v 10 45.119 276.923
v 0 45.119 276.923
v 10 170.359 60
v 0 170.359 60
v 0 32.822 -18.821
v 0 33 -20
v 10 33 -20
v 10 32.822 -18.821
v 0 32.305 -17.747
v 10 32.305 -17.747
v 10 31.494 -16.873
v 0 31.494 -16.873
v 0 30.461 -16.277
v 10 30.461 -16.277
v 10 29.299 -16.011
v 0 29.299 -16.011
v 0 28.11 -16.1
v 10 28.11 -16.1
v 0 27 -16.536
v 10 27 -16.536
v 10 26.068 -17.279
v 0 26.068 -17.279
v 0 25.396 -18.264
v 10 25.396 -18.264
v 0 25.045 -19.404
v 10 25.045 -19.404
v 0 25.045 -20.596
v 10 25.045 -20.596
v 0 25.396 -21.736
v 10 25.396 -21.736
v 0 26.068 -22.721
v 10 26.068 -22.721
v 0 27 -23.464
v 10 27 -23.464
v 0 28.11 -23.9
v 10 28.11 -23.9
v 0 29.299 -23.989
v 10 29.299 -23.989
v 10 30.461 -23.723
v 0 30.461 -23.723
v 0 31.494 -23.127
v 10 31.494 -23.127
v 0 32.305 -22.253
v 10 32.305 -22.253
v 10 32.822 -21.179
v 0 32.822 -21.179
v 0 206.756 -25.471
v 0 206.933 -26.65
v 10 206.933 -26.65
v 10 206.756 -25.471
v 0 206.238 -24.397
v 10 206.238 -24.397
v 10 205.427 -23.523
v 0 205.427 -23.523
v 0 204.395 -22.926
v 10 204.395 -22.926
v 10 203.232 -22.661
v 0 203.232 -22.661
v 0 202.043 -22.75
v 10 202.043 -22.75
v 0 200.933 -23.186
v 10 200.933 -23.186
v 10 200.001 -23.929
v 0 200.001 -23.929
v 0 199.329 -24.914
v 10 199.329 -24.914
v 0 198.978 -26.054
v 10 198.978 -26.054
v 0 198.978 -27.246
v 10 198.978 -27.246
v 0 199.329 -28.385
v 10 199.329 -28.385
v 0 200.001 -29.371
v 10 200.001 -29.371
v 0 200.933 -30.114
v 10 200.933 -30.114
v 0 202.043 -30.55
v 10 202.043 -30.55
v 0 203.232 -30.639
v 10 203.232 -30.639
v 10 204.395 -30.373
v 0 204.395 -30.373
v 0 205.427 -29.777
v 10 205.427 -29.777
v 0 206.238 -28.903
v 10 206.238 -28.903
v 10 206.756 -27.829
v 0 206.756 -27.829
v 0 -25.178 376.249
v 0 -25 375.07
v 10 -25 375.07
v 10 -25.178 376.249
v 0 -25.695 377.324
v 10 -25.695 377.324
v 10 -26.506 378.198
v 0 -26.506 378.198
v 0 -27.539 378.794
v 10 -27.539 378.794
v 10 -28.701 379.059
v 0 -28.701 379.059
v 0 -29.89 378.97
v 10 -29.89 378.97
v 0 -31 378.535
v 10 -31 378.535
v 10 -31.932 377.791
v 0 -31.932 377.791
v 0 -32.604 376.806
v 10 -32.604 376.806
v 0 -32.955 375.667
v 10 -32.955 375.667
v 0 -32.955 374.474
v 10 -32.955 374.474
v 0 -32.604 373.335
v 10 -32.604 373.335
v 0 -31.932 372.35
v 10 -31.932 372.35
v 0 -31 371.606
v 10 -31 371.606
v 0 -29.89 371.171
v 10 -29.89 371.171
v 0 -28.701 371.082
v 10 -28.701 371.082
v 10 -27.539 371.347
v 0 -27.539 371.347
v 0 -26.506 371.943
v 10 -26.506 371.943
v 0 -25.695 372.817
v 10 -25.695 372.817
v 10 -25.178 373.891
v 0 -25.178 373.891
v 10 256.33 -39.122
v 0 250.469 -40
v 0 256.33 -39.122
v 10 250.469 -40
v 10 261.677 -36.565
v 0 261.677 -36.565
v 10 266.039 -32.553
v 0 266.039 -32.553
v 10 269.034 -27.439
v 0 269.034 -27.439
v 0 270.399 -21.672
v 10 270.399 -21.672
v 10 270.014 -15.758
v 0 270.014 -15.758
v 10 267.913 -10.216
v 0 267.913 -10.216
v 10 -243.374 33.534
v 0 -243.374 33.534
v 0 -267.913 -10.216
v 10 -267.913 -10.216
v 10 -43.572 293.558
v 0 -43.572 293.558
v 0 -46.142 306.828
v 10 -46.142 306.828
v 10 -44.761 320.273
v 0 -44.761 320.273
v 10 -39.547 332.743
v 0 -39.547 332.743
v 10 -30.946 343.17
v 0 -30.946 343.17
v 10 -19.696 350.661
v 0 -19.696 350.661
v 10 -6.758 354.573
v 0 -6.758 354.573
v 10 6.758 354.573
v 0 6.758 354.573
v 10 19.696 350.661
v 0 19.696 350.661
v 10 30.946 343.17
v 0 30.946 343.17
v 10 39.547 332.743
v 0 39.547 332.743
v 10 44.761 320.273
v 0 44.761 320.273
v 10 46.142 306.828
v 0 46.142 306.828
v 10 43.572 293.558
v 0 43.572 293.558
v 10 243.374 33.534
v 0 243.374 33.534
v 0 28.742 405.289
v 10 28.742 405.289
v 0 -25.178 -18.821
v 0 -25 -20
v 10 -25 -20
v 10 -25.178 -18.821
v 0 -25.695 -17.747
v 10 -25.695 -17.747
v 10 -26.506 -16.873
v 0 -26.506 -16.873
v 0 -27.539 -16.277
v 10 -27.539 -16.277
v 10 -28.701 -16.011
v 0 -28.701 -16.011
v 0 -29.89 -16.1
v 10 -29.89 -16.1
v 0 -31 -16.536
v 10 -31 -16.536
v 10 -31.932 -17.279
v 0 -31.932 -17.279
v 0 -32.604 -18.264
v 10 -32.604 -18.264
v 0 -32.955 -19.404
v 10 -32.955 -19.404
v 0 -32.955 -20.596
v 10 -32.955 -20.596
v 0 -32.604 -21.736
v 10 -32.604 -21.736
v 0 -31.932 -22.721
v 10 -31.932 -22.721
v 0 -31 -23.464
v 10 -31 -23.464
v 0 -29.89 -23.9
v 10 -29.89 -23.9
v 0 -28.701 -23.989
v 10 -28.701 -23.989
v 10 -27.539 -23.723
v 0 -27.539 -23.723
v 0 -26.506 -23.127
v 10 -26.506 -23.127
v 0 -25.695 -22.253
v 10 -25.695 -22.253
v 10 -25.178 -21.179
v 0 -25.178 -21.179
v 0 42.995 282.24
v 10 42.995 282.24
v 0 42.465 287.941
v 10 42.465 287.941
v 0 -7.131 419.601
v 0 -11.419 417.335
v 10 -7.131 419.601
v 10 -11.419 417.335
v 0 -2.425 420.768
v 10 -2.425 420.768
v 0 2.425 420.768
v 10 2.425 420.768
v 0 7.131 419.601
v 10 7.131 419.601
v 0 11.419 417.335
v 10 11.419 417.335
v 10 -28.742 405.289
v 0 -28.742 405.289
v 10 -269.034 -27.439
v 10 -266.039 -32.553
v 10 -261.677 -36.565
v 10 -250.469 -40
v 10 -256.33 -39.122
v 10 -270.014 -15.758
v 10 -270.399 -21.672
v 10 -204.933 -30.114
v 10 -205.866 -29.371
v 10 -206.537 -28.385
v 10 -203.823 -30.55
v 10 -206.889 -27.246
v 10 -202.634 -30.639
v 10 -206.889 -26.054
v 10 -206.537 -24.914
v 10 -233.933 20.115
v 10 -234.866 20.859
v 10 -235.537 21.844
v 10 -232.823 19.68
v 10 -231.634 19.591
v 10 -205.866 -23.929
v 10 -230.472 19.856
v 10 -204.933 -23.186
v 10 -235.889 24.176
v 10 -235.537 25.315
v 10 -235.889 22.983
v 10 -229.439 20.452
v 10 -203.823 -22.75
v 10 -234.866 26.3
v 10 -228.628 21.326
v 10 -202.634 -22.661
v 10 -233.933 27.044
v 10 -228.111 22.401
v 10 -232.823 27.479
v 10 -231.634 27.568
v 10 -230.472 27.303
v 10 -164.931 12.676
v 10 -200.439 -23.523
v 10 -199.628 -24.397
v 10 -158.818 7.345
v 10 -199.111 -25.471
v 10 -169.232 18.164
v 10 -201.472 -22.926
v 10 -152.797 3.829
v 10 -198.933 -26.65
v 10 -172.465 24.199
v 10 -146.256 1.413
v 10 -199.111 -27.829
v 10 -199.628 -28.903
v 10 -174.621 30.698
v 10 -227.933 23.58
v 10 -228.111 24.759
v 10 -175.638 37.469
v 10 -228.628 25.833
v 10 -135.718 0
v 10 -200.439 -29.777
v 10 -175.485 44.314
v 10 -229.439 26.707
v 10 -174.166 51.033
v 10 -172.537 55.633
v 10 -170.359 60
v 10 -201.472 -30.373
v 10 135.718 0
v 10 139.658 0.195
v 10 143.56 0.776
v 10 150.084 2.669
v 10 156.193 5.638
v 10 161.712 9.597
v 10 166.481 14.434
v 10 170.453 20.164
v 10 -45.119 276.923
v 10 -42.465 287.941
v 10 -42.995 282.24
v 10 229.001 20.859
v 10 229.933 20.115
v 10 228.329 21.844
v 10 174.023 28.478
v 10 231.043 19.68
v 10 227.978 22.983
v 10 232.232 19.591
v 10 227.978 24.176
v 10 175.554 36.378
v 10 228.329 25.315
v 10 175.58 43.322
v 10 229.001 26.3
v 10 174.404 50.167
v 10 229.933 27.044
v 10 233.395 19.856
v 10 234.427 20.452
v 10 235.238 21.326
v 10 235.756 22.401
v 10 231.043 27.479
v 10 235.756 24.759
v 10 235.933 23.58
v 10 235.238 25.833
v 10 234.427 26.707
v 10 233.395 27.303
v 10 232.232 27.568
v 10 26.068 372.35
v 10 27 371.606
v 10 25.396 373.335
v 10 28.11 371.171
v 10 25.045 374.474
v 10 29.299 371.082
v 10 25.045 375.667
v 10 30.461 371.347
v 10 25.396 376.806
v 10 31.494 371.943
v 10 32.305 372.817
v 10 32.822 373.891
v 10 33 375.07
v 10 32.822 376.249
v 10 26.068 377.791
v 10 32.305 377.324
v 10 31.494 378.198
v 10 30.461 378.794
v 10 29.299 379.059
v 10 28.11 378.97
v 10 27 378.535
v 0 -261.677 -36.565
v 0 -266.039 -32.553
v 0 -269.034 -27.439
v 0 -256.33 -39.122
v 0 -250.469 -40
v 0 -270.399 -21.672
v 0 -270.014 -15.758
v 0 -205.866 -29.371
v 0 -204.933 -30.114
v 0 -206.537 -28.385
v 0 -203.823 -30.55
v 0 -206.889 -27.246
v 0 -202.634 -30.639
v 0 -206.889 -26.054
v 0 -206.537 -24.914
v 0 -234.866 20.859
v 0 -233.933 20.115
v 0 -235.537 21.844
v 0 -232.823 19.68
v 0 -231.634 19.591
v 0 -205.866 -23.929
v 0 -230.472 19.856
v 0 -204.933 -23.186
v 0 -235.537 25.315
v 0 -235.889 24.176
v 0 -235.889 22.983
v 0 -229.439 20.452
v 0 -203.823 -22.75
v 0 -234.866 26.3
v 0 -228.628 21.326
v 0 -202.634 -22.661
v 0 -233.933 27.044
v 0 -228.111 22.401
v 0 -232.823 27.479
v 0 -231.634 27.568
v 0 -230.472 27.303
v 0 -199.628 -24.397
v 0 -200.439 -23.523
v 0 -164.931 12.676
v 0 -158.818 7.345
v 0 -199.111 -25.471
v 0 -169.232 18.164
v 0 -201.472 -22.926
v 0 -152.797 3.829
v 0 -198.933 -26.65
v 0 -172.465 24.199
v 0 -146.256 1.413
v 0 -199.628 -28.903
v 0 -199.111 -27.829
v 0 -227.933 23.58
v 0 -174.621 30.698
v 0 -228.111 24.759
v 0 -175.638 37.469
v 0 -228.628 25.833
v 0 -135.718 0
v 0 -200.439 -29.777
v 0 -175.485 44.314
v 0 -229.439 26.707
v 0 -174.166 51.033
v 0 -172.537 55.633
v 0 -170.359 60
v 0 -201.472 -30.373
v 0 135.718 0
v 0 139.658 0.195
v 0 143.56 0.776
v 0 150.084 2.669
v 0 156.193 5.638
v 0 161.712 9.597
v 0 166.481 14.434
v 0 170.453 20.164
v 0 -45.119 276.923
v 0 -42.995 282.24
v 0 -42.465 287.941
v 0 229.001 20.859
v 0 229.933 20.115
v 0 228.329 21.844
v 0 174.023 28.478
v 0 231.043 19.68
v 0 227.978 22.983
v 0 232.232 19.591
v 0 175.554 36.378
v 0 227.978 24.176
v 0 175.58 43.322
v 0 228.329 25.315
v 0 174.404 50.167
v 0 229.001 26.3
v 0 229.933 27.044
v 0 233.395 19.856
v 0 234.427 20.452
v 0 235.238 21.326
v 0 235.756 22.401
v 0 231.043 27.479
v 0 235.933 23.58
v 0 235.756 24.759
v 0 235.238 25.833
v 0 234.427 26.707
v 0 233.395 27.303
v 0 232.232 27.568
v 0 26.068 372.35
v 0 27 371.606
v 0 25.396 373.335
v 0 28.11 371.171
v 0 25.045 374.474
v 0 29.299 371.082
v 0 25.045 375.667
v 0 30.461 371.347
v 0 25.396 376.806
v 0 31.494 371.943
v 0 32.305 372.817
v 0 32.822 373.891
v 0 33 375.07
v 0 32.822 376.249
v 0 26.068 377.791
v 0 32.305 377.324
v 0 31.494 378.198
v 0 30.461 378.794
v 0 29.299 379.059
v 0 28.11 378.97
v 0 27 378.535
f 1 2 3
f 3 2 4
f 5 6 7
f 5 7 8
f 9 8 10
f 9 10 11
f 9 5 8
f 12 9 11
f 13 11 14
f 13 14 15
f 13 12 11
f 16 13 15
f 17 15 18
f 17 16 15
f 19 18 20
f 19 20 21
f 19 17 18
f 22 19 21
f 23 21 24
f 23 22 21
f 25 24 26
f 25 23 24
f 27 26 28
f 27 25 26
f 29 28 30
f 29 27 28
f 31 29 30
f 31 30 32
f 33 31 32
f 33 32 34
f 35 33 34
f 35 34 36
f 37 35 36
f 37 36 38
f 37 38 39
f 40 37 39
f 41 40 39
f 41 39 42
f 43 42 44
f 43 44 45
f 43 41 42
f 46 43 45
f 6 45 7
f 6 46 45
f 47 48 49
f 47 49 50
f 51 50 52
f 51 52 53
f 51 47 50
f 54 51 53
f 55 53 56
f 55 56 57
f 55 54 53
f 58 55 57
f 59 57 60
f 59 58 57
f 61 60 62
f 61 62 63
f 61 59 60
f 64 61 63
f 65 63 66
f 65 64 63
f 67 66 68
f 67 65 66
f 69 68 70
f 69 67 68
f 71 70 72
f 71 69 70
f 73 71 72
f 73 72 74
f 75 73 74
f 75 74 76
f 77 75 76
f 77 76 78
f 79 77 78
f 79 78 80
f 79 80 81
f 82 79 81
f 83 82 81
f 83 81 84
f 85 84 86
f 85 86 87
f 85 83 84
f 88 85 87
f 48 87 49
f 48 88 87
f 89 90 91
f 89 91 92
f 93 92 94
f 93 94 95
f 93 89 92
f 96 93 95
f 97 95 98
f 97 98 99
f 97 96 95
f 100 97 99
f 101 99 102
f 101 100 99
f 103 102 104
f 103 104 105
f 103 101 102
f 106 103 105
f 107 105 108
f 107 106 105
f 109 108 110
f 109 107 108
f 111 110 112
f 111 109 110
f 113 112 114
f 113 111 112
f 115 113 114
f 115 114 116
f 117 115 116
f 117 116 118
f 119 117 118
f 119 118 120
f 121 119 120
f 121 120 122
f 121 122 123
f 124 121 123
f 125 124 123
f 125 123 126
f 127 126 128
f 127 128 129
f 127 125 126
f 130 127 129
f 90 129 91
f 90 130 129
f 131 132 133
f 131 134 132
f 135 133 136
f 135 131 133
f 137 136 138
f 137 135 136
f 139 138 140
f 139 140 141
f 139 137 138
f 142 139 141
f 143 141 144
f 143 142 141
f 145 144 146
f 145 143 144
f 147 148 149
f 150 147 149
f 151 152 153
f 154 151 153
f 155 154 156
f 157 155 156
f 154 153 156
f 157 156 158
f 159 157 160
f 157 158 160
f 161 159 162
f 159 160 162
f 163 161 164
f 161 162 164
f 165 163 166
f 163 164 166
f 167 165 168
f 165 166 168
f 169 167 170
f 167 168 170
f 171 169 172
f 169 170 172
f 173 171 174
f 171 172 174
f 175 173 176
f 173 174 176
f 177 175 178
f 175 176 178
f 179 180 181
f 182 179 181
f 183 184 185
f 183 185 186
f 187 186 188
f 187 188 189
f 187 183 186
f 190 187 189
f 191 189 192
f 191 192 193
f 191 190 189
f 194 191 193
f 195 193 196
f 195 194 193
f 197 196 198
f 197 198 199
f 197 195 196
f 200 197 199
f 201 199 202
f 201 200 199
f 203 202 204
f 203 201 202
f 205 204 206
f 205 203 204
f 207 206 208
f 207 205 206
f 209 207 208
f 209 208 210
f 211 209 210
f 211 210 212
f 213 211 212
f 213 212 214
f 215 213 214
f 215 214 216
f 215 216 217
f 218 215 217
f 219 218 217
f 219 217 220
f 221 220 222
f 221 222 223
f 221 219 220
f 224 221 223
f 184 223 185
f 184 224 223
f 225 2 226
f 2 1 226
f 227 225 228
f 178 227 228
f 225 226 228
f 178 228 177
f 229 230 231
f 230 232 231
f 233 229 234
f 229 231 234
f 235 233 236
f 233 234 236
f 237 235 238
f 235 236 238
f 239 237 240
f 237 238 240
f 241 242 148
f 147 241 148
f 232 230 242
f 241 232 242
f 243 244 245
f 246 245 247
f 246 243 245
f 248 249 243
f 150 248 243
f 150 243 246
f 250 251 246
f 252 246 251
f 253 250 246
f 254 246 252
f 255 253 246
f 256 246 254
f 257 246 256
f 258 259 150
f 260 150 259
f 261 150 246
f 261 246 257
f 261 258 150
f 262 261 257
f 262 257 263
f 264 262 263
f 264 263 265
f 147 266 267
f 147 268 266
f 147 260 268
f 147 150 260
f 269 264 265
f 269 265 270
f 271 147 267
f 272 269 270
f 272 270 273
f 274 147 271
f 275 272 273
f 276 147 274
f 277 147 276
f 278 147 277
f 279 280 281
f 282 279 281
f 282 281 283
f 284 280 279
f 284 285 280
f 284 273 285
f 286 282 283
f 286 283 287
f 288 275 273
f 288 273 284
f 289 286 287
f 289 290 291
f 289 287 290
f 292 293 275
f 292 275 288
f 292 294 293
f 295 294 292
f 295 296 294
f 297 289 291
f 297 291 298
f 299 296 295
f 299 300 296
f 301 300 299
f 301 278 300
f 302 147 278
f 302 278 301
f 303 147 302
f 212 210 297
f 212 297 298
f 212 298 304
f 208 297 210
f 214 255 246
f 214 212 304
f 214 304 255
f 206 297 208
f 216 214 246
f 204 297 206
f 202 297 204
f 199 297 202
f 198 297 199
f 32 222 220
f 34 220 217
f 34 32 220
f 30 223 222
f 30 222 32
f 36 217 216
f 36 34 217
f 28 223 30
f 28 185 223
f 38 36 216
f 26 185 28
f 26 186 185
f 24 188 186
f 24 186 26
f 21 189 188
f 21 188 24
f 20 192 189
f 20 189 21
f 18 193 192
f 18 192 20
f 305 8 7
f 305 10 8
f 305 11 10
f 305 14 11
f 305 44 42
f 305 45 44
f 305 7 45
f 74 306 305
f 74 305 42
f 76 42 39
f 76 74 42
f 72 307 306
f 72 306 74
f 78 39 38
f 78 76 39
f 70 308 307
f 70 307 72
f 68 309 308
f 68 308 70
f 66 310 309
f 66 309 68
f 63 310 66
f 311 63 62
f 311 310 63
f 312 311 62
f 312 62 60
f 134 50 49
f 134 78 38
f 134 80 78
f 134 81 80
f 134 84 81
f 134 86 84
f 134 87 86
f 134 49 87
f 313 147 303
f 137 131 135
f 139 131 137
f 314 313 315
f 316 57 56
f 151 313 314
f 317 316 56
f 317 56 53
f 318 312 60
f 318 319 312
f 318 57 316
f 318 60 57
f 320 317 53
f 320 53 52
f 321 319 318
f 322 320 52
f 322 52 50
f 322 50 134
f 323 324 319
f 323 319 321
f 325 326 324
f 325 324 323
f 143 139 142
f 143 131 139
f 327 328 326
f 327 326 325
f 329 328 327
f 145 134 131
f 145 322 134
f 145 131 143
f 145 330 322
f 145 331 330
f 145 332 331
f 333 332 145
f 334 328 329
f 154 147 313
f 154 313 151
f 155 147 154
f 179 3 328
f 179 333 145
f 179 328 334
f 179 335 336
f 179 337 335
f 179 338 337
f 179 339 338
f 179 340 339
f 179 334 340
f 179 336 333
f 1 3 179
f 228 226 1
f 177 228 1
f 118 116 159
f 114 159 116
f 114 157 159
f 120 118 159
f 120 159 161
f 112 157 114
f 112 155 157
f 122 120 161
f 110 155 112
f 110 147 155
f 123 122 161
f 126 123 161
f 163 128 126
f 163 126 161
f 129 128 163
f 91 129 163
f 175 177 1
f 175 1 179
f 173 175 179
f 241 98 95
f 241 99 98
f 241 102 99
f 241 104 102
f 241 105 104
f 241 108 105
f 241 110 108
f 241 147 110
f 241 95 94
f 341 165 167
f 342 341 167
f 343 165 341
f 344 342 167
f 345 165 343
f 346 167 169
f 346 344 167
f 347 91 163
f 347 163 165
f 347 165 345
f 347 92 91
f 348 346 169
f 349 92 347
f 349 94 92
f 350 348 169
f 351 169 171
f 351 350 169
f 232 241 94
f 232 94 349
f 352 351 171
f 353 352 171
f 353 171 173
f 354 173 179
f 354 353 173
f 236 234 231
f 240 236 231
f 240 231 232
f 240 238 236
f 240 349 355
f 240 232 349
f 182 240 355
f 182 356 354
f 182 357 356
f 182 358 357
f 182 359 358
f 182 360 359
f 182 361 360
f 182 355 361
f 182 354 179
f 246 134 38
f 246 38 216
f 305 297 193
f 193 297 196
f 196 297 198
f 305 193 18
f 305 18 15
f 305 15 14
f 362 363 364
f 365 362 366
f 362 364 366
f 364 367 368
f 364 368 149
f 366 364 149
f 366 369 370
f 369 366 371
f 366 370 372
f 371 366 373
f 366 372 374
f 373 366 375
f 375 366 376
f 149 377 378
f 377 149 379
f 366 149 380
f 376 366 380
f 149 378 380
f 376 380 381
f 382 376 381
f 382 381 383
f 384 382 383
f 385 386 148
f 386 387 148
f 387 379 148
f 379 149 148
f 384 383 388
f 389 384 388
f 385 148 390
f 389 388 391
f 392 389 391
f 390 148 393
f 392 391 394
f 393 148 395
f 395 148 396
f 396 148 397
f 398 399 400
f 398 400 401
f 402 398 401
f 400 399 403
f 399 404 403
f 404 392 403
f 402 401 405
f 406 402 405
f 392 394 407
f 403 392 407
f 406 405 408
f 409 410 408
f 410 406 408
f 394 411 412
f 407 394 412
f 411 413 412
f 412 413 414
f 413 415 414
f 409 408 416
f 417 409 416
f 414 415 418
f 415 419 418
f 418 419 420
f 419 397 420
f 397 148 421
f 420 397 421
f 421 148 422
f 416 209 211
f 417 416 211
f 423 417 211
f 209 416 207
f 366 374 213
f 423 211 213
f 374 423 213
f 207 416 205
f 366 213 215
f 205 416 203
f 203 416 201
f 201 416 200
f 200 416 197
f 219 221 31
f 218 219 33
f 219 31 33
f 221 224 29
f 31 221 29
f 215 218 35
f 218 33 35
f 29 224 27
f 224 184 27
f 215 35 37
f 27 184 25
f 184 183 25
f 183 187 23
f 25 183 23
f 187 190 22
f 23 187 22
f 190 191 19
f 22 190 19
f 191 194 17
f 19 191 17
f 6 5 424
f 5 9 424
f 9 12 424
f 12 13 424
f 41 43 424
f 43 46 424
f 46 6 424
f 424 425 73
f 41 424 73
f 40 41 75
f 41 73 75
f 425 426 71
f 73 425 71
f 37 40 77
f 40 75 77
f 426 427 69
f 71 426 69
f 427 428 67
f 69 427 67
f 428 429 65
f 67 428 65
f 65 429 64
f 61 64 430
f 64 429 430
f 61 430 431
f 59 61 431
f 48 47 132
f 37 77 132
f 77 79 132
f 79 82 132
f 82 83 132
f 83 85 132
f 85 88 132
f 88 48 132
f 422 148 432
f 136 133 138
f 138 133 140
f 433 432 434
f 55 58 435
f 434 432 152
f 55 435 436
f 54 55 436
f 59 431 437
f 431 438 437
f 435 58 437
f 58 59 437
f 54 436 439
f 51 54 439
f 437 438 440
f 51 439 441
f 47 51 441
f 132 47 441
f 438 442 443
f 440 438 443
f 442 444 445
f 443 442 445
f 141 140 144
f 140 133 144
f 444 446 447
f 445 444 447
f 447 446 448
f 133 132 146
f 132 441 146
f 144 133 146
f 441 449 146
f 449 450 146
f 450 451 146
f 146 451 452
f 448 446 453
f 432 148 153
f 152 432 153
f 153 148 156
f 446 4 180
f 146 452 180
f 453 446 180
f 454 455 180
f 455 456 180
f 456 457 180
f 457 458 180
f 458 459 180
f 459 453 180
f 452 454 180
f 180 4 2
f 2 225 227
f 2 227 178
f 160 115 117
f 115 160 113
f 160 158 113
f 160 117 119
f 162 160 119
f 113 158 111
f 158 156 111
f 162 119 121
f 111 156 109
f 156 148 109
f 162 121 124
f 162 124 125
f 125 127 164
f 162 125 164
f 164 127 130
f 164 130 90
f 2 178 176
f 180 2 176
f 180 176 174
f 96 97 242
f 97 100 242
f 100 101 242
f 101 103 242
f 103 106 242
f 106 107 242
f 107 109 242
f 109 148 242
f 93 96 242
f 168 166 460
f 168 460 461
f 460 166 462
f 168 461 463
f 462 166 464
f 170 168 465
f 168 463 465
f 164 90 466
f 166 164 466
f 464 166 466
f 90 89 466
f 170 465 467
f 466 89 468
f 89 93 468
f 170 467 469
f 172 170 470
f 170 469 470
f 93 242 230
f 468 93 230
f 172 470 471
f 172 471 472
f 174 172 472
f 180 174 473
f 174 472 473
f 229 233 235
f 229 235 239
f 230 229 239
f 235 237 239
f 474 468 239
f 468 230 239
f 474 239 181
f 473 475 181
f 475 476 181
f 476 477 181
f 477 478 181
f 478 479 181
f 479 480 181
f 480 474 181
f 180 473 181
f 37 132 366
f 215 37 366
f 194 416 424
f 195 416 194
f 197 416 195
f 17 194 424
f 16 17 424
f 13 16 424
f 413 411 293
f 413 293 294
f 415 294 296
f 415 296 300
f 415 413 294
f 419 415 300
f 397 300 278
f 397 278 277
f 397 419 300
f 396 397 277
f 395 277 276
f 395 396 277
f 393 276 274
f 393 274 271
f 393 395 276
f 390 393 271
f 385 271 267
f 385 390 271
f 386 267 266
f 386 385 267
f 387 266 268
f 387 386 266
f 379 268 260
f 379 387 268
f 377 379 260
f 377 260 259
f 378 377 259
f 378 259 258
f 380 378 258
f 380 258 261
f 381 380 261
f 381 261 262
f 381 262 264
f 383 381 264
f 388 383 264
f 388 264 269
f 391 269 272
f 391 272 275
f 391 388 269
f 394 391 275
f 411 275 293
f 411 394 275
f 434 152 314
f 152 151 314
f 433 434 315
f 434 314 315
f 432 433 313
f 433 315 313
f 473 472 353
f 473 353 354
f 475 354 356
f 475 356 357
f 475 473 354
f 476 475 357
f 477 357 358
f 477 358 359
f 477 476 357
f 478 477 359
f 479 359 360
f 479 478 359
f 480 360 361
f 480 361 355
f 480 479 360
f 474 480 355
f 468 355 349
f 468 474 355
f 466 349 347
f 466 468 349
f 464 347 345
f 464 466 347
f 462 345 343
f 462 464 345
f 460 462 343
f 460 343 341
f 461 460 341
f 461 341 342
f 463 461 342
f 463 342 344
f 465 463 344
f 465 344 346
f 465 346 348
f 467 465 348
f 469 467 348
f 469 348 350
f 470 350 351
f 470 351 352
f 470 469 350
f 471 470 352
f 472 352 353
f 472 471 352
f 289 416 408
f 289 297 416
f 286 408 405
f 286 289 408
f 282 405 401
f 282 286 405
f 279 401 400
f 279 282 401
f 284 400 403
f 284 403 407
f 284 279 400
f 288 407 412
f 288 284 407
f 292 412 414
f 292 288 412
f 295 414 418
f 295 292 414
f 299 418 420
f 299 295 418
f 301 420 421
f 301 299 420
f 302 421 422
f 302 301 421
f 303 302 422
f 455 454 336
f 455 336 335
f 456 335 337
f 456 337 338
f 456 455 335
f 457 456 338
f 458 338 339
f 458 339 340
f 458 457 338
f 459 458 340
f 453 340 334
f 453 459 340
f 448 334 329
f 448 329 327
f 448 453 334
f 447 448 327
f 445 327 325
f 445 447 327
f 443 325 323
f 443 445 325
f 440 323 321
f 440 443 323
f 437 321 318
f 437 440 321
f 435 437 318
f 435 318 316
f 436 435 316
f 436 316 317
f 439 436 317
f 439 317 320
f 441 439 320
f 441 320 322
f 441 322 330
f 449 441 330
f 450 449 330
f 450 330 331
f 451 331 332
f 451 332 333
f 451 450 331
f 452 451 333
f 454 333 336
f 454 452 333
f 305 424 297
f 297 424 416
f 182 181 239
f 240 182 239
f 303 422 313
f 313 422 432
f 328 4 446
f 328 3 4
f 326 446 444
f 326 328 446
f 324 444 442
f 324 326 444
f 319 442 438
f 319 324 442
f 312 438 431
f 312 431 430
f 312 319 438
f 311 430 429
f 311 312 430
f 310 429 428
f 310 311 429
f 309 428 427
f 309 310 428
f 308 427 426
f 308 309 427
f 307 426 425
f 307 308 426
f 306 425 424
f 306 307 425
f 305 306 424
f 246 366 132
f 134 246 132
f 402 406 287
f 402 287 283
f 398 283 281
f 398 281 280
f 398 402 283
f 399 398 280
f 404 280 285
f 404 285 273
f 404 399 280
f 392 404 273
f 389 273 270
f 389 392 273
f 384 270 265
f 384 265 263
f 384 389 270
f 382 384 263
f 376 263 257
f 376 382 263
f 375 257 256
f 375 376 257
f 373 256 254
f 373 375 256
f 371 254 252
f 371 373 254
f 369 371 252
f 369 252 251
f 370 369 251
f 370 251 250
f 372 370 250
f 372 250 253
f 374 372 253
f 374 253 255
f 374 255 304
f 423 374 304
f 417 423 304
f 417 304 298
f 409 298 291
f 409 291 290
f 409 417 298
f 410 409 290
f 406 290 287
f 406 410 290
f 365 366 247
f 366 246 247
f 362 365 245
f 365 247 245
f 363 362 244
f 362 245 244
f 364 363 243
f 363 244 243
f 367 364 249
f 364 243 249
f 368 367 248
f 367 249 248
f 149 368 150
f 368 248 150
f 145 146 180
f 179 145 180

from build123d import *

# Parameters (mm, degrees)
F1_R     = 4
F2_DEPTH = 10
F3_R     = 20
F4_R     = 40


with BuildPart() as f2:
    # F1 (on Right) → F2 (new body)
    with BuildSketch(Plane.YZ):
        Polygon((-284.6176624298, -40), (-145, -40), (0, -40), (145, -40), (284.6176624298, -40), (243.3743673133, 33.5336461051), (28.7415579511, 405.2885768915), (0, 425.2763390541), (-28.7415579511, 405.2885768915), (-243.3743673133, 33.5336461051), align=None)
        with Locations((-202.9333580064, -26.6499444856)):
            Circle(F1_R, mode=Mode.SUBTRACT)
        with Locations((-231.9333580064, 23.5795289339)):
            Circle(F1_R, mode=Mode.SUBTRACT)
        with Locations((-29, -20)):
            Circle(F1_R, mode=Mode.SUBTRACT)
        with Locations((29, -20)):
            Circle(F1_R, mode=Mode.SUBTRACT)
        with Locations((202.9333580064, -26.6499444856)):
            Circle(F1_R, mode=Mode.SUBTRACT)
        with Locations((231.9333580064, 23.5795289339)):
            Circle(F1_R, mode=Mode.SUBTRACT)
        with BuildLine():
            Line((205, 0), (0, 0))
            Line((0, 0), (-205, 0))
            Line((-205, 0), (-200.0730971241, 8.5336461051))
            Line((-200.0730971241, 8.5336461051), (-40, 285.7883832489))
            ThreePointArc((-40, 285.7883832489), (-40, 331.976404784), (0, 355.0704155516))
            ThreePointArc((0, 355.0704155516), (40, 331.976404784), (40, 285.7883832489))
            Line((40, 285.7883832489), (200.0730971241, 8.5336461051))
            Line((200.0730971241, 8.5336461051), (205, 0))
        make_face(mode=Mode.SUBTRACT)
        with Locations((-29, 375.0704155516)):
            Circle(F1_R, mode=Mode.SUBTRACT)
        with Locations((29, 375.0704155516)):
            Circle(F1_R, mode=Mode.SUBTRACT)
    extrude(amount=F2_DEPTH)

    # F3
    f3_edges = [f2.edges().sort_by_distance(p)[0] for p in [
        (5, -284.617662, -40),
        (5, 284.617662, -40),
        (5, 0, 425.276339),
        (5, -40, 285.788383),
        (5, 40, 285.788383),
    ]]
    fillet(f3_edges, radius=F3_R)

    # F4
    f4_edges = [f2.edges().sort_by_distance(p)[0] for p in [
        (5, 205, 0),
        (5, -205, 0),
    ]]
    fillet(f4_edges, radius=F4_R)


solid = f2.part
